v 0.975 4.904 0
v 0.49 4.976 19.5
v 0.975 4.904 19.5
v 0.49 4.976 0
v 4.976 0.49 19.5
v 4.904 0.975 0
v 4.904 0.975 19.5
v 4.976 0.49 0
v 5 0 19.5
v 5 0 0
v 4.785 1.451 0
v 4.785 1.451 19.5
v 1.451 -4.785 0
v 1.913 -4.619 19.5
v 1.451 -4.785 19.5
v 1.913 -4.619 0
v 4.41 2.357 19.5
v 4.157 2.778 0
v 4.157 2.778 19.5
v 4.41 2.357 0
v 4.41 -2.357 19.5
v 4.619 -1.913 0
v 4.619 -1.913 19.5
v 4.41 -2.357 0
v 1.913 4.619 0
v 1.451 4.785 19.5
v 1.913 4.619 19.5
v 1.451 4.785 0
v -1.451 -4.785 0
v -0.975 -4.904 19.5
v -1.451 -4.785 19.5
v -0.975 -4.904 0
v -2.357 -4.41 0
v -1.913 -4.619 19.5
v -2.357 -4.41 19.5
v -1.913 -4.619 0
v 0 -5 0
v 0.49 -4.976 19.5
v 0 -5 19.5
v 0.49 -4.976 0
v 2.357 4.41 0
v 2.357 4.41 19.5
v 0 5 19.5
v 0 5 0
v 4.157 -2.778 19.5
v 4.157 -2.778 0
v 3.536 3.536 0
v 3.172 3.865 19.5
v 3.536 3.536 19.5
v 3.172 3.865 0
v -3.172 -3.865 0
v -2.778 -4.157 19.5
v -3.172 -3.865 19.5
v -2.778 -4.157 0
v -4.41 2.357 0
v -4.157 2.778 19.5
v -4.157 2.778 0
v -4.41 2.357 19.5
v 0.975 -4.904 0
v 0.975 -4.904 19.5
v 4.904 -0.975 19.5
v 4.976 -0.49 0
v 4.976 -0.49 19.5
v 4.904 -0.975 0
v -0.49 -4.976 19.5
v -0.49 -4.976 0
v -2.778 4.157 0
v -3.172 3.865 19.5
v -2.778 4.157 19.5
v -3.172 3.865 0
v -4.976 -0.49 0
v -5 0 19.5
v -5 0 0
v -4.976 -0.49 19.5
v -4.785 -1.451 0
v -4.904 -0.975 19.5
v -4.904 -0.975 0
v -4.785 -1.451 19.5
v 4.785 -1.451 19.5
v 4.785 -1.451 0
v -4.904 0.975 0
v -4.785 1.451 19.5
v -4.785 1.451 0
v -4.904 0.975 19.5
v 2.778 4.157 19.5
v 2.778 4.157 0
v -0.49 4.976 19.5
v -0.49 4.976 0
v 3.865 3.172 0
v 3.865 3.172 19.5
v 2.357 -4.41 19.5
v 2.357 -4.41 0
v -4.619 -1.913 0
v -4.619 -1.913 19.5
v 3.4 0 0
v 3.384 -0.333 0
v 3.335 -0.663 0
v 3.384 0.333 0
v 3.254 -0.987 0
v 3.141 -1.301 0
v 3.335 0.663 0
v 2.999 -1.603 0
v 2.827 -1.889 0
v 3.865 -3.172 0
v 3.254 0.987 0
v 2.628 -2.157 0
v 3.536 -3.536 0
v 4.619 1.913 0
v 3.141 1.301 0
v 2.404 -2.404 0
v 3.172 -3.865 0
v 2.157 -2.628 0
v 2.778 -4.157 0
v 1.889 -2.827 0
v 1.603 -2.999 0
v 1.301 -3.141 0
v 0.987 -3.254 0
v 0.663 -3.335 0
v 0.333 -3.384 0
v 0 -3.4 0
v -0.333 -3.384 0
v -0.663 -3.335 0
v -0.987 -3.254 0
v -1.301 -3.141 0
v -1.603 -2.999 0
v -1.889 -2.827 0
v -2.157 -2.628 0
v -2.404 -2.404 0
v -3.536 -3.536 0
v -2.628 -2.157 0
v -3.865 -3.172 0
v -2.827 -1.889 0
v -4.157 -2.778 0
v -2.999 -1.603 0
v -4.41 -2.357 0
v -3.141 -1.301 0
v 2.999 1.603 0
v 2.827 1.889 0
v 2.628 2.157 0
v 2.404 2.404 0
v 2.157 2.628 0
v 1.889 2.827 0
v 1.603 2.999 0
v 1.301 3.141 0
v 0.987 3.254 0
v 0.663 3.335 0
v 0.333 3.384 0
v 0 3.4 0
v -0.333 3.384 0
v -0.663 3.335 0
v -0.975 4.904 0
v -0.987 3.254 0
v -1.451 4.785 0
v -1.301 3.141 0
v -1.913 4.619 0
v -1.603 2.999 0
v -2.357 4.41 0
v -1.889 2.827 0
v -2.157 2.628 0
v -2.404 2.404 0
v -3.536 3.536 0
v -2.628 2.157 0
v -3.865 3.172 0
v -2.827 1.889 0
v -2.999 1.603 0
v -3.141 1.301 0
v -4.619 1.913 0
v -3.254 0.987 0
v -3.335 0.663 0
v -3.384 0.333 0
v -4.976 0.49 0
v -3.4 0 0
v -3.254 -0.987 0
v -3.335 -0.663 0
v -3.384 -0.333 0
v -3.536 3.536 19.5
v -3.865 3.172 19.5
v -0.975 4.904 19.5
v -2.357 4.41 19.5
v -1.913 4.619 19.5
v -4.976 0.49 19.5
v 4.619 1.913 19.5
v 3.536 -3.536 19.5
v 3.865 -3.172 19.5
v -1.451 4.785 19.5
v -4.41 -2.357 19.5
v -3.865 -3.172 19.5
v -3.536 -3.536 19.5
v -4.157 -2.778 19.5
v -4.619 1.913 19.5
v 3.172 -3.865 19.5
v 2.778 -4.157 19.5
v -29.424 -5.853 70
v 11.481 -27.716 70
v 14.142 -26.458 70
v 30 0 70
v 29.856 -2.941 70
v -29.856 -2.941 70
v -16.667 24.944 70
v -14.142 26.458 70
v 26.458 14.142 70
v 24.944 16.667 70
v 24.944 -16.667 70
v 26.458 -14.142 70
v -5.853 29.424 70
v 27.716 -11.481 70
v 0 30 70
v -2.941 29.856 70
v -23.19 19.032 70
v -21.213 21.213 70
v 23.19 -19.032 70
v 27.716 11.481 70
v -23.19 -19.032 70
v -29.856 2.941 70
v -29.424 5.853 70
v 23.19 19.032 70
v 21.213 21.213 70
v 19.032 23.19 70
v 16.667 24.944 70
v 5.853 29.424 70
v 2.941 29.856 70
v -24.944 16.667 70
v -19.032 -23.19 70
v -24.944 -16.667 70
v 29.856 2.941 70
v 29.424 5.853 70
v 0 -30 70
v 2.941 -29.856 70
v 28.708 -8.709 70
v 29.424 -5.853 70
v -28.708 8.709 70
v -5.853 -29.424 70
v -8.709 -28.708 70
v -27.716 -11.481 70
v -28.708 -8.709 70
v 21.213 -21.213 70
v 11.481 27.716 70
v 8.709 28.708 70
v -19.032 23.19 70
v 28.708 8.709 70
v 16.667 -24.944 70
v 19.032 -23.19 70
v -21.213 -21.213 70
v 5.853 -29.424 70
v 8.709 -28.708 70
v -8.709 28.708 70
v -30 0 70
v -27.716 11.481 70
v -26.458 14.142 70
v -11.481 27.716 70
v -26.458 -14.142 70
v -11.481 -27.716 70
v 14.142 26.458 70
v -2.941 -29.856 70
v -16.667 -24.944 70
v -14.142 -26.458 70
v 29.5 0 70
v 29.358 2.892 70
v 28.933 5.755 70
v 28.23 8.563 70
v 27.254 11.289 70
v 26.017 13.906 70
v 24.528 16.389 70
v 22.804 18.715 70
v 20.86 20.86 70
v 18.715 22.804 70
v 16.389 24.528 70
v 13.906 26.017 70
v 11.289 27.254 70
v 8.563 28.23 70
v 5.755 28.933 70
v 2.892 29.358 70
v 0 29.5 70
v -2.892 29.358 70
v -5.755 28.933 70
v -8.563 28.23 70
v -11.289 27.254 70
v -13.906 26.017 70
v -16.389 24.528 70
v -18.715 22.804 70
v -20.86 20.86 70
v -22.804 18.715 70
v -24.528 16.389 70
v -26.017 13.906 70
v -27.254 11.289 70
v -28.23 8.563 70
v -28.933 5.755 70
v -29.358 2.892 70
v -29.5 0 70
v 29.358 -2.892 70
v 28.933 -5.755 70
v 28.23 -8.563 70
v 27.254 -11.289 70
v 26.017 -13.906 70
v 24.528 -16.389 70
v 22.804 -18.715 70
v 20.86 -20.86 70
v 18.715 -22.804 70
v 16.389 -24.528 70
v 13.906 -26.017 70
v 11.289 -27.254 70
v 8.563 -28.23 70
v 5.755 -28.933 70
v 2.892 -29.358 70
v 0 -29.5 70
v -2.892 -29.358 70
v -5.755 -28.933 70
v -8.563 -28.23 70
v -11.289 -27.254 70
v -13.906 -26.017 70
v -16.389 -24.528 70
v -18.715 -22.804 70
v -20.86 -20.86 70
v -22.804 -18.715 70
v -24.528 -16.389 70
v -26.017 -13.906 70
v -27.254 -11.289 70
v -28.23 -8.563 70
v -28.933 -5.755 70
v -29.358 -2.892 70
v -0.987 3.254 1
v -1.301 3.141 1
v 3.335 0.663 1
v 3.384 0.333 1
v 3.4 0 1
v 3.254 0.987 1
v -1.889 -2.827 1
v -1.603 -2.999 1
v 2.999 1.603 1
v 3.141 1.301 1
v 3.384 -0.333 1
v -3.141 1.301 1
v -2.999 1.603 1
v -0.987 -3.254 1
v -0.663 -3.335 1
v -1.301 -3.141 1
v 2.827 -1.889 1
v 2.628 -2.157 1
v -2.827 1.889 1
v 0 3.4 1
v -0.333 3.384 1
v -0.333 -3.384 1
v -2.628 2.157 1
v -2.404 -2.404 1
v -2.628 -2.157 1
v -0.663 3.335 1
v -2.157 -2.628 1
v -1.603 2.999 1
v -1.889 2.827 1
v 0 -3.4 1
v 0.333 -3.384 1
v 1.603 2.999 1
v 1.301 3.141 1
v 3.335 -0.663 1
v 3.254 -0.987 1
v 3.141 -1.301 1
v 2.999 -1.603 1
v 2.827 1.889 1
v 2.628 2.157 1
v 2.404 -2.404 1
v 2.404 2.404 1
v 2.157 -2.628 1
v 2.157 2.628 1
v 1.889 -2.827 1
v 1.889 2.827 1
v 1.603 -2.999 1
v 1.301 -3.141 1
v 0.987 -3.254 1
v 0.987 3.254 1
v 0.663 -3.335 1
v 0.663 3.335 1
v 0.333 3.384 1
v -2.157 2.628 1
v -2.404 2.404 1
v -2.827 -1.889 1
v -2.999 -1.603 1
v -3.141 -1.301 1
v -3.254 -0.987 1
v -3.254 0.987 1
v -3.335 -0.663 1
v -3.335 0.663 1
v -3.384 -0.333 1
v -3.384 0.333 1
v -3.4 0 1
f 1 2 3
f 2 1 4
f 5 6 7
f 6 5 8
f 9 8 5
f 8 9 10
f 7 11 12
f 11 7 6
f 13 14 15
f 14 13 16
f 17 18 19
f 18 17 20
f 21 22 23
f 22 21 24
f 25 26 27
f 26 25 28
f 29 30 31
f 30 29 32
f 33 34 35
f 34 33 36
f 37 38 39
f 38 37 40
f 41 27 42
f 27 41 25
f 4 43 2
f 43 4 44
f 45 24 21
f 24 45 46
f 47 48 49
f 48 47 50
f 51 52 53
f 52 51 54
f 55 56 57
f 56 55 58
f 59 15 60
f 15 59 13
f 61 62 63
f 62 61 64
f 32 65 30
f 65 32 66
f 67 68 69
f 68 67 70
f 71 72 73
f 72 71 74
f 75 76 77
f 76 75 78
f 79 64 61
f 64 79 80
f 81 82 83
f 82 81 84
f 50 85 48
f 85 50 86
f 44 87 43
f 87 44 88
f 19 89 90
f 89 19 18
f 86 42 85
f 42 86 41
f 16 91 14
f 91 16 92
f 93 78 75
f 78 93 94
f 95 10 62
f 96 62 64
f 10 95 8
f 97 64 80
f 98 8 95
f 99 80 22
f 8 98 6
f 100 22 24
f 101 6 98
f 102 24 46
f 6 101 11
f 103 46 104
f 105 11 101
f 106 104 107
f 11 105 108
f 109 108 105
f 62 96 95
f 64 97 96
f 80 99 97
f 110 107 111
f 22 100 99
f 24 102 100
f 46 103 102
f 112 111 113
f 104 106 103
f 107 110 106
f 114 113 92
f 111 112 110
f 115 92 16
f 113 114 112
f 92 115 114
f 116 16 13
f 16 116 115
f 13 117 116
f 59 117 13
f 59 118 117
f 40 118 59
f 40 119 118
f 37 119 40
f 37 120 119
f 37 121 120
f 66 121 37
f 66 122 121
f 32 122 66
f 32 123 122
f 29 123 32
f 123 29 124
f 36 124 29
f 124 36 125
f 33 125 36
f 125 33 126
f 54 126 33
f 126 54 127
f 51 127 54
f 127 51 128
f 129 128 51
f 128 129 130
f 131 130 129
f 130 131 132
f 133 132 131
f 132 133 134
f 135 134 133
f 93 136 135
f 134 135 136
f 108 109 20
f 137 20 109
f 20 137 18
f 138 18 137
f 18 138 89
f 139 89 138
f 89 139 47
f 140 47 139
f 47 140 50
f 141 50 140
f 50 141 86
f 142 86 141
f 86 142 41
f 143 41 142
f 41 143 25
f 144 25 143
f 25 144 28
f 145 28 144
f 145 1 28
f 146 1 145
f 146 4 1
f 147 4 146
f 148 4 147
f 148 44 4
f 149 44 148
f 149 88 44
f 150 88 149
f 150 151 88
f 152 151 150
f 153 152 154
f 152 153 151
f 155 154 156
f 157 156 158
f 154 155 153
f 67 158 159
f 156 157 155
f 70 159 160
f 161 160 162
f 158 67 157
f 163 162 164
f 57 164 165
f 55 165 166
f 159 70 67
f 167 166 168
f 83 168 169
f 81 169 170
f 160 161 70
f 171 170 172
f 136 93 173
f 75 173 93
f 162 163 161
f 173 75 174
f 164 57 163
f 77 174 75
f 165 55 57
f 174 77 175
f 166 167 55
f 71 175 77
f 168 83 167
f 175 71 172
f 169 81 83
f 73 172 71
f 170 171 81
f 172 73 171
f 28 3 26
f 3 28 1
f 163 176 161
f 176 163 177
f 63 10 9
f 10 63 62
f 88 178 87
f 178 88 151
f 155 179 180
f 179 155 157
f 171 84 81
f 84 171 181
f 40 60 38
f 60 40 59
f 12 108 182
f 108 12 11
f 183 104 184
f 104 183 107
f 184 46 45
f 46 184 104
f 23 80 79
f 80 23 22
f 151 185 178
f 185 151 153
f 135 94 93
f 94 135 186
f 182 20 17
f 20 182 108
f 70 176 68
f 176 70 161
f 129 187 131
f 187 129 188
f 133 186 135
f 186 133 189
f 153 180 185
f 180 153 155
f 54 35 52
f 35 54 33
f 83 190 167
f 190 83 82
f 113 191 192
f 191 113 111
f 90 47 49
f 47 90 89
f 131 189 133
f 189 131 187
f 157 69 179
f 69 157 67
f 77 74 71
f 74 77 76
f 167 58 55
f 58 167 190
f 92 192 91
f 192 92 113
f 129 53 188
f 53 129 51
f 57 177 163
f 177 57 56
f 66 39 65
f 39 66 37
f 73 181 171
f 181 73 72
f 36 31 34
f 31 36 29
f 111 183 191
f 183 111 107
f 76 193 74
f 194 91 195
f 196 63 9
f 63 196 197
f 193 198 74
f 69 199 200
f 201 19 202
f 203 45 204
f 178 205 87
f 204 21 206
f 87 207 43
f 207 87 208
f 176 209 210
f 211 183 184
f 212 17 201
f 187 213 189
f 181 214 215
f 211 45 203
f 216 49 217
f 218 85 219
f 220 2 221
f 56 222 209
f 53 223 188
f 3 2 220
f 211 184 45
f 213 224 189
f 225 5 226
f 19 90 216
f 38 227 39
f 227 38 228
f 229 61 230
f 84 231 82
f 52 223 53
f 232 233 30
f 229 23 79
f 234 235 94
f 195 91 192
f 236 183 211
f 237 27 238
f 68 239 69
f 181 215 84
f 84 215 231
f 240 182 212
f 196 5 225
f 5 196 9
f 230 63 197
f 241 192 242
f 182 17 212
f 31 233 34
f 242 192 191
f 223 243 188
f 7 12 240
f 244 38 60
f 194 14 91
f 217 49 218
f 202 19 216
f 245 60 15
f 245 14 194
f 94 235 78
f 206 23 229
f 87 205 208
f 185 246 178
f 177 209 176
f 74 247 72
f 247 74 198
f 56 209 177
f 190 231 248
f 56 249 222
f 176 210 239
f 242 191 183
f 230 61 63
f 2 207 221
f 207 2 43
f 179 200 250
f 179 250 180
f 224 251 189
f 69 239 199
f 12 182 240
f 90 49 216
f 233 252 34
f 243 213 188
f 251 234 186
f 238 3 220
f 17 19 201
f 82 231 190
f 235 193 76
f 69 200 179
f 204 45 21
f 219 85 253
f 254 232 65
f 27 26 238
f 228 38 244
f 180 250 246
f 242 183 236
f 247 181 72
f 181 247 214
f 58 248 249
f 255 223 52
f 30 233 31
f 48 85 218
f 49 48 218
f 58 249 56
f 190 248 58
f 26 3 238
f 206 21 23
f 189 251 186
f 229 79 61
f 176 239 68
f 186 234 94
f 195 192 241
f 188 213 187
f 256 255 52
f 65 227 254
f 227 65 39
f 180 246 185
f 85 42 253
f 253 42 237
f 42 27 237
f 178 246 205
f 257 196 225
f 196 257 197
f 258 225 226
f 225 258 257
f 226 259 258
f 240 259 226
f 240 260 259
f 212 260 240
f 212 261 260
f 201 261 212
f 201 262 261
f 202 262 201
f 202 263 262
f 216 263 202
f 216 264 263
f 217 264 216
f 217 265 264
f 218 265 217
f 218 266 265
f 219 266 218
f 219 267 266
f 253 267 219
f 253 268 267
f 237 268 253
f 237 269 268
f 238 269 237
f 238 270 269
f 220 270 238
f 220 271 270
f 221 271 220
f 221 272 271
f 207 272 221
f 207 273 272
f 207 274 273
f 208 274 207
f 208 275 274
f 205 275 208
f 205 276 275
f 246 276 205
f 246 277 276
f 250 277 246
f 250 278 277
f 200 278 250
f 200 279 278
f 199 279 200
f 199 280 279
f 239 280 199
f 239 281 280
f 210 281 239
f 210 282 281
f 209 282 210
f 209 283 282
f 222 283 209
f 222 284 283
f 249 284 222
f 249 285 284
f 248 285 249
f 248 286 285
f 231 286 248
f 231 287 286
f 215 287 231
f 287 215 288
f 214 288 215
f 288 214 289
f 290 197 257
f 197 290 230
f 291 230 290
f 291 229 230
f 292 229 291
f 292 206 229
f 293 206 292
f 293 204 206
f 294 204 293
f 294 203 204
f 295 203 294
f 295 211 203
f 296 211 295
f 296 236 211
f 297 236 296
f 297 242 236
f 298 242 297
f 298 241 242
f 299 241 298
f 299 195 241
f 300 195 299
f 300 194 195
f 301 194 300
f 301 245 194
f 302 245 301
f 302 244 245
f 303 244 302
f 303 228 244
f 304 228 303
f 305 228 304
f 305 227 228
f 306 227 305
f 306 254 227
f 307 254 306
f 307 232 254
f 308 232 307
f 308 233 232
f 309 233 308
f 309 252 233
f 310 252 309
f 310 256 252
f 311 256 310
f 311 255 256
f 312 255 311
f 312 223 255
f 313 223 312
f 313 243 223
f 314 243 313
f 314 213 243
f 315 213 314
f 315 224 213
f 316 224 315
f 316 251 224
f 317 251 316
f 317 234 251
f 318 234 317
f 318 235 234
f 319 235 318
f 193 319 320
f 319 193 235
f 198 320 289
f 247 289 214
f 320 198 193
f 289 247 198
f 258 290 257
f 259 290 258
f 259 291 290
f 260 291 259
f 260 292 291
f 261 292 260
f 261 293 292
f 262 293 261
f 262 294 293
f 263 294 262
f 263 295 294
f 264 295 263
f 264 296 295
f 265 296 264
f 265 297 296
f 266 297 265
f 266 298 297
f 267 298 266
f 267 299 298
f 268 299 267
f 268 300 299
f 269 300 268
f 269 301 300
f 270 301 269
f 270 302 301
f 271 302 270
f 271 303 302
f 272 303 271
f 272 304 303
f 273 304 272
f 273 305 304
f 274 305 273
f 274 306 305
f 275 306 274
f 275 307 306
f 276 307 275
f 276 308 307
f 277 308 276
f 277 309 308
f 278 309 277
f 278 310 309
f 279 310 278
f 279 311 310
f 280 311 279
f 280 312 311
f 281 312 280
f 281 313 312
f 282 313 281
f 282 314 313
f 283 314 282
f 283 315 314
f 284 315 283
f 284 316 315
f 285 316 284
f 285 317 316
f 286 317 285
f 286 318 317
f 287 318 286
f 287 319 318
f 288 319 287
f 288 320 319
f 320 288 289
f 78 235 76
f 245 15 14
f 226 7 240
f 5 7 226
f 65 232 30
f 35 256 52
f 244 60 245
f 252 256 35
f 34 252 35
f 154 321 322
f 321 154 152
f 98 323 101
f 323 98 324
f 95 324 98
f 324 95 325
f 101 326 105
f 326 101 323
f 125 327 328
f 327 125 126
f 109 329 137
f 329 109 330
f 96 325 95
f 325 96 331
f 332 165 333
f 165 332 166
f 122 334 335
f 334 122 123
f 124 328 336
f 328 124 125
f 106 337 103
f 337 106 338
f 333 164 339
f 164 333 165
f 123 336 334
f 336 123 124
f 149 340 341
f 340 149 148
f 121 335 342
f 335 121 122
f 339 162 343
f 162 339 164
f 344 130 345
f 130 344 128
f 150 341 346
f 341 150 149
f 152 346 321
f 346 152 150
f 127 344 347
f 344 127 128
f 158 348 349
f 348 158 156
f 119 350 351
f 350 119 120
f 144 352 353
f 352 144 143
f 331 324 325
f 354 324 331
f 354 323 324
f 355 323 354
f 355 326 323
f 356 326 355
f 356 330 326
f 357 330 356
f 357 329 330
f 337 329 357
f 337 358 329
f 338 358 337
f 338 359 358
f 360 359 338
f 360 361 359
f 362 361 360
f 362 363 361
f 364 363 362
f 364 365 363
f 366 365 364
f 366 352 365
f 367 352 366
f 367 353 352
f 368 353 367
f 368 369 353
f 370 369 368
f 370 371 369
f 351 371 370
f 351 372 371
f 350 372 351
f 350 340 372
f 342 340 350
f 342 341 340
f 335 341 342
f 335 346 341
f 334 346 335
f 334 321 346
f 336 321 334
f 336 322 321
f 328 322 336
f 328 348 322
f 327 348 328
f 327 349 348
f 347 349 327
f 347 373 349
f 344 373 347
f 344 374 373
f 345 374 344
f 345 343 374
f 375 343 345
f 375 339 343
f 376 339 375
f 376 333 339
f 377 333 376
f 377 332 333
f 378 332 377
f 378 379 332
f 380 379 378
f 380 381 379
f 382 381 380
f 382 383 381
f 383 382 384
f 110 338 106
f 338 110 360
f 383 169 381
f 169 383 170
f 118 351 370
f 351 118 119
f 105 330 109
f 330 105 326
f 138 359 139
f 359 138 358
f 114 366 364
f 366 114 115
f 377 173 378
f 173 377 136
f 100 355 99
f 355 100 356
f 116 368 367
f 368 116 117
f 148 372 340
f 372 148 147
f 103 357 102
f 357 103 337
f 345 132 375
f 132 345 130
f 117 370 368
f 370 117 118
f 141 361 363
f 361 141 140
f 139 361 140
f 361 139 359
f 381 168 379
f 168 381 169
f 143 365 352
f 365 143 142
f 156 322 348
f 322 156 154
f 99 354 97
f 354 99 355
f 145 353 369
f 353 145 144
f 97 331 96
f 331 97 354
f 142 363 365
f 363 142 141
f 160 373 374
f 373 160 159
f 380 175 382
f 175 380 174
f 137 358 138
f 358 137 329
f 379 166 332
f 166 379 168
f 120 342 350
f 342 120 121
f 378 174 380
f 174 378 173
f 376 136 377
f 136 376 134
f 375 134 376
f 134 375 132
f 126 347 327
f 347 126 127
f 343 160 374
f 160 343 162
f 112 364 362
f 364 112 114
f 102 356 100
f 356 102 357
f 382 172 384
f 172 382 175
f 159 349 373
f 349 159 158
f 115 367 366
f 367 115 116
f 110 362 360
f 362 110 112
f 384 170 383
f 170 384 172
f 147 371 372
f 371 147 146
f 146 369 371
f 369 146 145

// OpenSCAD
// Lab funnel - printed upright with wide opening at the top
// Units: mm. Wall thickness 1.6 mm throughout.

$fn = 64;

// ---- Dimensions ----
spout_od        = 10;    // outer diameter of straight spout
spout_id        = spout_od - 2 * 1.6;  // spout bore (6.8 mm)
spout_h         = 20;    // spout height, z = 0 .. 20

cone_bottom_od  = spout_od;       // cone starts at spout diameter
cone_top_od     = 60;    // cone rim diameter
cone_h          = spout_h + 30;   // cone height, z = 20 .. 50

eps             = 0.5;   // overlap for clean boolean cuts

// ---- Model ----
difference() {
    union() {
        // Spout
        cylinder(h = spout_h, d = spout_od);

        // Cone (extended slightly into spout to fuse solids)
        translate([0, 0, spout_h - eps])
            cylinder(h = cone_h + eps, d1 = cone_bottom_od, d2 = cone_top_od);
    }

    // Bottom outlet
    translate([0, 0, -eps])
        cylinder(h = eps + 1, d = spout_id);

    // Top rim cut (open top)
    translate([0, 0, spout_h + cone_h])
        cylinder(h = eps + 1, d = cone_top_od - 1);
}
